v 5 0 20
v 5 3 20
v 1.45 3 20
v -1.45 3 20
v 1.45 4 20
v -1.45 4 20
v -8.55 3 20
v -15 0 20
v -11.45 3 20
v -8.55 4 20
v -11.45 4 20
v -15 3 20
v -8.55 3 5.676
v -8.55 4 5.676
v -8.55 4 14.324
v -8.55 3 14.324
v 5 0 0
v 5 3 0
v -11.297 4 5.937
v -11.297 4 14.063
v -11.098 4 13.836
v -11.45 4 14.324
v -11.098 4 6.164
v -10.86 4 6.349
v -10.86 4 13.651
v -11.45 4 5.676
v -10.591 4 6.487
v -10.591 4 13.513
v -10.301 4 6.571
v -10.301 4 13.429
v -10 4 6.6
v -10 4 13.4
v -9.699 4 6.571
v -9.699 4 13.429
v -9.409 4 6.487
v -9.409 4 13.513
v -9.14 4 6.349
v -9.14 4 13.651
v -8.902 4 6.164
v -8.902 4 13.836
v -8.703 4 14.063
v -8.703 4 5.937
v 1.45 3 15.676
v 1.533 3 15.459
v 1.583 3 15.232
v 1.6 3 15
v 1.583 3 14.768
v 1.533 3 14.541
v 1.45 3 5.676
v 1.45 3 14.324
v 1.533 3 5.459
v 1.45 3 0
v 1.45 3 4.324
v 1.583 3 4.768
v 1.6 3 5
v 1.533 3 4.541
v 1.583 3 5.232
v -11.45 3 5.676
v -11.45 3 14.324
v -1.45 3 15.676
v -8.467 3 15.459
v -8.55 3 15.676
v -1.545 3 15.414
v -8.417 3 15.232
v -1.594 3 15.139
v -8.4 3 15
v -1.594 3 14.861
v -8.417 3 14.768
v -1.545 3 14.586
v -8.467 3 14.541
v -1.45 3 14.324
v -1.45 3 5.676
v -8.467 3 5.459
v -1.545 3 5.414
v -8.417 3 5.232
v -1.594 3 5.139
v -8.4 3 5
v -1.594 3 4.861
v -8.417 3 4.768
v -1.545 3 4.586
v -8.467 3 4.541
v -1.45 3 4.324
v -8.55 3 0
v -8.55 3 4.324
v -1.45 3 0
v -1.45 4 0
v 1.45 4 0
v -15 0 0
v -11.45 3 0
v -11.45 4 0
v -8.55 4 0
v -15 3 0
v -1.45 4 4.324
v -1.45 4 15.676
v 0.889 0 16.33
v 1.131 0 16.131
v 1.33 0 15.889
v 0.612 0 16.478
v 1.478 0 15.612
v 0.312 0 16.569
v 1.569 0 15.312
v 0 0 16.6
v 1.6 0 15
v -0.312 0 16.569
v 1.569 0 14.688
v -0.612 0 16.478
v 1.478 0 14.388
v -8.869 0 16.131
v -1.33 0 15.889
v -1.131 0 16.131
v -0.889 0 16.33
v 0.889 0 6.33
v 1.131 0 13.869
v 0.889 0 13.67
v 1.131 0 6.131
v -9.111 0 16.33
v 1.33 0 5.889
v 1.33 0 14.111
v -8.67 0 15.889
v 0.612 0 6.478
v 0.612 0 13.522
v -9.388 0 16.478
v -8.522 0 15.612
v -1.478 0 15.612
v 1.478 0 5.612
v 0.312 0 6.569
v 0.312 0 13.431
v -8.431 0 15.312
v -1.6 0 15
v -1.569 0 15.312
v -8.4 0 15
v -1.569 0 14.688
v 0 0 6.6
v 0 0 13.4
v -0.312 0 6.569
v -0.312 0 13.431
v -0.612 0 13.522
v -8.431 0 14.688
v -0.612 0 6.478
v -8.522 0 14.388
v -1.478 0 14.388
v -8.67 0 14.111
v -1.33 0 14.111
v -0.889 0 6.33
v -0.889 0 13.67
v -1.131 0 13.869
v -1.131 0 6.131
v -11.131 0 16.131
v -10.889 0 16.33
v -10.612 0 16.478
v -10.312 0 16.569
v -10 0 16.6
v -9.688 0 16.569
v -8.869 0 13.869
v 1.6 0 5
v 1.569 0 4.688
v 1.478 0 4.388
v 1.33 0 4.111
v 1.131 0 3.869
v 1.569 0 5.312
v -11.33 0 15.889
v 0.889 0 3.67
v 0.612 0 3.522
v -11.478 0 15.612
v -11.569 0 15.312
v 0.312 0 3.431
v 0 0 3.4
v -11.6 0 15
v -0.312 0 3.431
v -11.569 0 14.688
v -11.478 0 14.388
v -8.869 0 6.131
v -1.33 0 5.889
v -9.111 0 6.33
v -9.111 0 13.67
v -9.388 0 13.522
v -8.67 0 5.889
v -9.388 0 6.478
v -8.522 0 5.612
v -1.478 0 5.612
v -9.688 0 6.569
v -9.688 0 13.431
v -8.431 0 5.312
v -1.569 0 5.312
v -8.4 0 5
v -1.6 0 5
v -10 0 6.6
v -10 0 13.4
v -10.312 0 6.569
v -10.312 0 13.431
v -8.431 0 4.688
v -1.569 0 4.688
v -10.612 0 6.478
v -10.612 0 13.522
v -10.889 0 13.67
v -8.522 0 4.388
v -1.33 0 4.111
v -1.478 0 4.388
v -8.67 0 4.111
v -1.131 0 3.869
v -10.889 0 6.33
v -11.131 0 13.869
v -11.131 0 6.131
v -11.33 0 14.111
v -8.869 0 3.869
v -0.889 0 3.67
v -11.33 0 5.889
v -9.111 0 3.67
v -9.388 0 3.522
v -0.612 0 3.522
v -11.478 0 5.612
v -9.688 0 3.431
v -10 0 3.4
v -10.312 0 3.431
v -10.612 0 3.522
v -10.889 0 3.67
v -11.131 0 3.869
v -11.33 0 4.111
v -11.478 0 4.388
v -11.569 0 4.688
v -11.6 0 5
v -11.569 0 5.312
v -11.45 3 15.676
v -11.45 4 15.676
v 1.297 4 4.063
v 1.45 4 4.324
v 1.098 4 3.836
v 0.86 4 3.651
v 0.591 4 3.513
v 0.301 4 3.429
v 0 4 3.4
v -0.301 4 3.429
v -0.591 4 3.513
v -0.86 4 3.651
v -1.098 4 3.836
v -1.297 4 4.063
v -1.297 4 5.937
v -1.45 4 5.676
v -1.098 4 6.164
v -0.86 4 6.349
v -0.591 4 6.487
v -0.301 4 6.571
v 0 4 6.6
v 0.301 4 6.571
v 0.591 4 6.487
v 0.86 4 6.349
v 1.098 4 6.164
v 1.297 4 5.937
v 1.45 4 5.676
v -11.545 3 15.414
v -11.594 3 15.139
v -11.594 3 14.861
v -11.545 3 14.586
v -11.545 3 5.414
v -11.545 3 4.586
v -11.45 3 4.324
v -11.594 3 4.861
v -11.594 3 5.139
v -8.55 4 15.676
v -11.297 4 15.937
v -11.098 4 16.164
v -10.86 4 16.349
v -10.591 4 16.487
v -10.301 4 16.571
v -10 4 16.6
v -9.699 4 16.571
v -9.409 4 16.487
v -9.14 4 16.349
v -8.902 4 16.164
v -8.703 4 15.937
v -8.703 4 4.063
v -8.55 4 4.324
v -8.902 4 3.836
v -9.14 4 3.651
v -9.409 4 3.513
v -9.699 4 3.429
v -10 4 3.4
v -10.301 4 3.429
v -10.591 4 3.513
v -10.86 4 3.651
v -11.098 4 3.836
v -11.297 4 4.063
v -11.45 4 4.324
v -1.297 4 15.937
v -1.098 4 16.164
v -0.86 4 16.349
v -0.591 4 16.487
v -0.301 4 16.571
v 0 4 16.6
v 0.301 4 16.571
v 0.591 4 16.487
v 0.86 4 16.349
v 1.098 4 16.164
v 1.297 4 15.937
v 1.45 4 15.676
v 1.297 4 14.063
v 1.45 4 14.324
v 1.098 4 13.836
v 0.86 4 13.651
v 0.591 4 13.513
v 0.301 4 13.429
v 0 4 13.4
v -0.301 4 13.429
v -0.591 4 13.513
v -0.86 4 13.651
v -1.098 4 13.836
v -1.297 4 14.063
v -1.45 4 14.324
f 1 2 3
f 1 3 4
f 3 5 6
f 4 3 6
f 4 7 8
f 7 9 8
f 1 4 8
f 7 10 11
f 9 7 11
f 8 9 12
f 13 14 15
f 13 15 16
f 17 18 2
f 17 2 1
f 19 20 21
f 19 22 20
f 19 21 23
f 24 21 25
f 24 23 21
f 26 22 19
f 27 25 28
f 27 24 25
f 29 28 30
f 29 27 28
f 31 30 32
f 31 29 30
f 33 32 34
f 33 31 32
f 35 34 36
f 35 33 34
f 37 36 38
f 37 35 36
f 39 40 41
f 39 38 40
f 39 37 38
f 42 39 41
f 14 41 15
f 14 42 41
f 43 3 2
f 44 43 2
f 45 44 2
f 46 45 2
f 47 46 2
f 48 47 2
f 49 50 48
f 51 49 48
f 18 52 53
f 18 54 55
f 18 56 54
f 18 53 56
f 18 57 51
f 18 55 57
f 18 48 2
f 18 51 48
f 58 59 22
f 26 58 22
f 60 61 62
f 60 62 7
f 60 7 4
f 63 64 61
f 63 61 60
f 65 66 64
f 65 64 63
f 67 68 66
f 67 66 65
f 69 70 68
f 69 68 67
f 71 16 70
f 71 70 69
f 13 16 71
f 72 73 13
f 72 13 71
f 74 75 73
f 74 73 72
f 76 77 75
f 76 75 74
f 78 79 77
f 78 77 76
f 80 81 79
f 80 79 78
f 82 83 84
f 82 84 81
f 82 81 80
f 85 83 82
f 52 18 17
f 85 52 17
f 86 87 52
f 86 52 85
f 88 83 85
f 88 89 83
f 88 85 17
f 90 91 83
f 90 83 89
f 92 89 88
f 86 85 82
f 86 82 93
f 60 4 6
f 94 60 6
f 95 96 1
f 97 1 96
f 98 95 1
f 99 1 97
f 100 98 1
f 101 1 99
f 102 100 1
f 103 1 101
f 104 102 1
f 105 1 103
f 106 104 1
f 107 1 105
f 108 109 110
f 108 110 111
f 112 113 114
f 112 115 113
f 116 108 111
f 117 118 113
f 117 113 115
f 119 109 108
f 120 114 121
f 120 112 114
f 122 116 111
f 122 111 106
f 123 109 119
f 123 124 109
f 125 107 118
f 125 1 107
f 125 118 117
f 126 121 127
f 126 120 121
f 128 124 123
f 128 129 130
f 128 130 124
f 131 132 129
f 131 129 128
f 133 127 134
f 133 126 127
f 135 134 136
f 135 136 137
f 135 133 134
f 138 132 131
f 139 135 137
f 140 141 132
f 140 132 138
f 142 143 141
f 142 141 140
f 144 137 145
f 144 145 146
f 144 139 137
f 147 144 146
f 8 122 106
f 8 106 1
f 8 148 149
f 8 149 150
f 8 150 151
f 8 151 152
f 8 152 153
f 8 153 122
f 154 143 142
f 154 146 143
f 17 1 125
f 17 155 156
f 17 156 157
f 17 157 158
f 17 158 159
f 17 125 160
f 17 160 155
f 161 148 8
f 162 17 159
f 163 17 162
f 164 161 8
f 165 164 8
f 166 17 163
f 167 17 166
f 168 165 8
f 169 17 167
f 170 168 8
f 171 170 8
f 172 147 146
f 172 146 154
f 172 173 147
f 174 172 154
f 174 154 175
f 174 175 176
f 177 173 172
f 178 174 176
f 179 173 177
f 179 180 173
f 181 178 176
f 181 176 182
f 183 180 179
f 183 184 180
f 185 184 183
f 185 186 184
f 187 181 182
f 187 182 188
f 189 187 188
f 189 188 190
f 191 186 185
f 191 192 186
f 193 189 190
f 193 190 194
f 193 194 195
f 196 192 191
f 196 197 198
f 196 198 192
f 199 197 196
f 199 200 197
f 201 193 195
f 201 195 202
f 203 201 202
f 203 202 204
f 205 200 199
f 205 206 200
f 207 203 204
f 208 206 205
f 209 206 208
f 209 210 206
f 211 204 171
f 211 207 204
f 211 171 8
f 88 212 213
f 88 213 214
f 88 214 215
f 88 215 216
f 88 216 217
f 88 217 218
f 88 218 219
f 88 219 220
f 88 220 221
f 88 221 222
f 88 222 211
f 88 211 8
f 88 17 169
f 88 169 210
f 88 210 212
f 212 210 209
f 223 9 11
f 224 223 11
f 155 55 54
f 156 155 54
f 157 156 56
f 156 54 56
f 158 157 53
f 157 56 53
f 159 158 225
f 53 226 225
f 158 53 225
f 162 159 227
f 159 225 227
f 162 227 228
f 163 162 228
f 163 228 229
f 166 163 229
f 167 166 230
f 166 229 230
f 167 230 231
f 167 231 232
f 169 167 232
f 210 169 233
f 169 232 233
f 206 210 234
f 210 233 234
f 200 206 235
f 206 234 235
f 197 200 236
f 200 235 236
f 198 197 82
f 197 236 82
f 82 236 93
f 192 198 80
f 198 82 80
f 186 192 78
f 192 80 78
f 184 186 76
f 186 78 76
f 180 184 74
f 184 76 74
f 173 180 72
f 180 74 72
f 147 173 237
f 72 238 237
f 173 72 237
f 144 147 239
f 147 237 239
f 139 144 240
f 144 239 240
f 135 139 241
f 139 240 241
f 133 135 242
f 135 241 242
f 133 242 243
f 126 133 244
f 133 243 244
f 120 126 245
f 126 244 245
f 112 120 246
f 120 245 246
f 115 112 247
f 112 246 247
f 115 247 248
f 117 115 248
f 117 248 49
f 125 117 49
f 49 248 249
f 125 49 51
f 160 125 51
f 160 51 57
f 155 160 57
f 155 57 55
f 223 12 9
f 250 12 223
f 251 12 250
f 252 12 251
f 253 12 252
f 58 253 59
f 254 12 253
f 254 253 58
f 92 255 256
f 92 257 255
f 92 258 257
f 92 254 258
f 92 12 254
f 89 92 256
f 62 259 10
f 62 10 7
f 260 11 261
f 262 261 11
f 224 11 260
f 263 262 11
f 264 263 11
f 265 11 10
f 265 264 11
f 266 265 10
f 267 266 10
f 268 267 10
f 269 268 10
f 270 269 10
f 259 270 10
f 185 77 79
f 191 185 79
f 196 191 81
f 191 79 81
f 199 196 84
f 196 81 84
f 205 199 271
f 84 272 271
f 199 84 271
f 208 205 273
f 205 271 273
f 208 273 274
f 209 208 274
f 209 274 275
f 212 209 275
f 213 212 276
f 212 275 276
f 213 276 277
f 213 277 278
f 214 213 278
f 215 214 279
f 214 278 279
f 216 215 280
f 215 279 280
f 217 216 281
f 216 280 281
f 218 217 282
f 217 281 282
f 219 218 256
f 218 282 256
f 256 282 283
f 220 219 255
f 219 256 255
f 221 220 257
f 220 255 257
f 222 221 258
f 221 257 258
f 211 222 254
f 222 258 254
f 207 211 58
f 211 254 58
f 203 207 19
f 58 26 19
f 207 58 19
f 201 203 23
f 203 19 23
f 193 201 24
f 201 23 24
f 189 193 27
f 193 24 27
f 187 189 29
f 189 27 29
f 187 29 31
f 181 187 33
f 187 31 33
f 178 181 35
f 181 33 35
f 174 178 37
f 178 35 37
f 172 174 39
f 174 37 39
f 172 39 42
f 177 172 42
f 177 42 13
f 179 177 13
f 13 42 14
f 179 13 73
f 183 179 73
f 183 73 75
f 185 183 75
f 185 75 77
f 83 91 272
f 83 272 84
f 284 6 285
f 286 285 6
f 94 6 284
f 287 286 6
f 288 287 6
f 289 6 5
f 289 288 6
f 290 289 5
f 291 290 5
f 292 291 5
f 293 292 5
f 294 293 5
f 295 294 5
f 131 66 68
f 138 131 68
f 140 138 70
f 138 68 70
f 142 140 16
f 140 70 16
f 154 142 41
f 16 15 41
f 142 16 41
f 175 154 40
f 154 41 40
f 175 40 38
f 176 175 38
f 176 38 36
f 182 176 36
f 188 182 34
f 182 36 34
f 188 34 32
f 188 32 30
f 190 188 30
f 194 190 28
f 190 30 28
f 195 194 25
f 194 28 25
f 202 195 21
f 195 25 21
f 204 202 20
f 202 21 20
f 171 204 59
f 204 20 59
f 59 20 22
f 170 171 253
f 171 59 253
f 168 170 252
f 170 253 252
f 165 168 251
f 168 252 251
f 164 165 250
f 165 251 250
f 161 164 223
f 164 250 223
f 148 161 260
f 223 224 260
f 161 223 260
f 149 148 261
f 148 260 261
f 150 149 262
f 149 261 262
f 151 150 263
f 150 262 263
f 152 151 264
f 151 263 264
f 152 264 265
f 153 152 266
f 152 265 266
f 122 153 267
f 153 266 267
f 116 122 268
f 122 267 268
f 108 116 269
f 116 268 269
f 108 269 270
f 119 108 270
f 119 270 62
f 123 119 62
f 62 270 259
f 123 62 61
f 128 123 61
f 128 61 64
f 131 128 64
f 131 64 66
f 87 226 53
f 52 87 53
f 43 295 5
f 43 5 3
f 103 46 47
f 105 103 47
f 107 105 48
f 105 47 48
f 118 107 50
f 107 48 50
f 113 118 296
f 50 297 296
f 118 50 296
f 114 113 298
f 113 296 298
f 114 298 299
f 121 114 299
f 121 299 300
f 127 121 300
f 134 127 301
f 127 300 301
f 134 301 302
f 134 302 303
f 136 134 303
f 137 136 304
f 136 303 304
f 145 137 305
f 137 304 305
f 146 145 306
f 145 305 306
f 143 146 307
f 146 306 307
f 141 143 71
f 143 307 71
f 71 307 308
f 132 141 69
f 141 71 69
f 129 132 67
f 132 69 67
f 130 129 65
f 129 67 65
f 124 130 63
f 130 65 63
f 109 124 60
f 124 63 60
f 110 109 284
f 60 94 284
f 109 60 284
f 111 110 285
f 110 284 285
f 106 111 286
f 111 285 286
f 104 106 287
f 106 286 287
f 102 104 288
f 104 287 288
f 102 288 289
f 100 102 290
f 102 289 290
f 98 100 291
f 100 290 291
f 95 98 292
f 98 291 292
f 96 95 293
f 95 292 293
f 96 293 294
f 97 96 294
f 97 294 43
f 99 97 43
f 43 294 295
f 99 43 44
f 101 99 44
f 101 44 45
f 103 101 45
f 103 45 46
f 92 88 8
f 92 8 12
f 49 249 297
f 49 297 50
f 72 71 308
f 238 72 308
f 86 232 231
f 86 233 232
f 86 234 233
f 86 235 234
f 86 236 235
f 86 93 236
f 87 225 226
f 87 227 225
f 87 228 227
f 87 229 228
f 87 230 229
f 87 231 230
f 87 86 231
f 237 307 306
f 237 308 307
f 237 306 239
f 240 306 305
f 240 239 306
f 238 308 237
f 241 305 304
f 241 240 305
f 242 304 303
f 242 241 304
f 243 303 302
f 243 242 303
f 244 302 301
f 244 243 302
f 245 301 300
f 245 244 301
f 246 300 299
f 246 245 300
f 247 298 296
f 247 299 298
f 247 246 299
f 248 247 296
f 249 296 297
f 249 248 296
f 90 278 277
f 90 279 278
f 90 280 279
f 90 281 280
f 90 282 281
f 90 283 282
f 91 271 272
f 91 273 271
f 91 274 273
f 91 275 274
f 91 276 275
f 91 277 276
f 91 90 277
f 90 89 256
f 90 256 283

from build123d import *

# Parameters (mm, degrees)
MAIN_DEPTH                 = 20
ESQUISSE2_R                = 1.6
TOPHOLE_DEPTH              = 5
R_P_TITION_LIN_AIRE1_COUNT = 2
R_P_TITION_LIN_AIRE1_PITCH = 10


with BuildPart() as part:
    # Esquisse1 → Main (new body)
    with BuildSketch(Plane.XY):
        Polygon((-5, 0), (-5, 3), (-1.45, 3), (-1.45, 4), (1.45, 4), (1.45, 3), (5, 3), (5, 0), align=None)
    main = extrude(amount=MAIN_DEPTH)

    # Esquisse2 → TopHole (cut, through all)
    with BuildSketch(Plane(origin=(0, 4, 0), x_dir=(1, 0, 0), z_dir=(0, 1, 0))):
        with Locations((0, -5)):
            Circle(ESQUISSE2_R)
        with Locations((0, -15)):
            Circle(ESQUISSE2_R)
    tophole = extrude(amount=-TOPHOLE_DEPTH, mode=Mode.SUBTRACT)

    # Répétition linéaire1: Main, TopHole ×2
    with Locations(*[(-i * R_P_TITION_LIN_AIRE1_PITCH, 0, 0) for i in range(1, R_P_TITION_LIN_AIRE1_COUNT)]):
        add(main)
        add(tophole, mode=Mode.SUBTRACT)


solid = part.part
